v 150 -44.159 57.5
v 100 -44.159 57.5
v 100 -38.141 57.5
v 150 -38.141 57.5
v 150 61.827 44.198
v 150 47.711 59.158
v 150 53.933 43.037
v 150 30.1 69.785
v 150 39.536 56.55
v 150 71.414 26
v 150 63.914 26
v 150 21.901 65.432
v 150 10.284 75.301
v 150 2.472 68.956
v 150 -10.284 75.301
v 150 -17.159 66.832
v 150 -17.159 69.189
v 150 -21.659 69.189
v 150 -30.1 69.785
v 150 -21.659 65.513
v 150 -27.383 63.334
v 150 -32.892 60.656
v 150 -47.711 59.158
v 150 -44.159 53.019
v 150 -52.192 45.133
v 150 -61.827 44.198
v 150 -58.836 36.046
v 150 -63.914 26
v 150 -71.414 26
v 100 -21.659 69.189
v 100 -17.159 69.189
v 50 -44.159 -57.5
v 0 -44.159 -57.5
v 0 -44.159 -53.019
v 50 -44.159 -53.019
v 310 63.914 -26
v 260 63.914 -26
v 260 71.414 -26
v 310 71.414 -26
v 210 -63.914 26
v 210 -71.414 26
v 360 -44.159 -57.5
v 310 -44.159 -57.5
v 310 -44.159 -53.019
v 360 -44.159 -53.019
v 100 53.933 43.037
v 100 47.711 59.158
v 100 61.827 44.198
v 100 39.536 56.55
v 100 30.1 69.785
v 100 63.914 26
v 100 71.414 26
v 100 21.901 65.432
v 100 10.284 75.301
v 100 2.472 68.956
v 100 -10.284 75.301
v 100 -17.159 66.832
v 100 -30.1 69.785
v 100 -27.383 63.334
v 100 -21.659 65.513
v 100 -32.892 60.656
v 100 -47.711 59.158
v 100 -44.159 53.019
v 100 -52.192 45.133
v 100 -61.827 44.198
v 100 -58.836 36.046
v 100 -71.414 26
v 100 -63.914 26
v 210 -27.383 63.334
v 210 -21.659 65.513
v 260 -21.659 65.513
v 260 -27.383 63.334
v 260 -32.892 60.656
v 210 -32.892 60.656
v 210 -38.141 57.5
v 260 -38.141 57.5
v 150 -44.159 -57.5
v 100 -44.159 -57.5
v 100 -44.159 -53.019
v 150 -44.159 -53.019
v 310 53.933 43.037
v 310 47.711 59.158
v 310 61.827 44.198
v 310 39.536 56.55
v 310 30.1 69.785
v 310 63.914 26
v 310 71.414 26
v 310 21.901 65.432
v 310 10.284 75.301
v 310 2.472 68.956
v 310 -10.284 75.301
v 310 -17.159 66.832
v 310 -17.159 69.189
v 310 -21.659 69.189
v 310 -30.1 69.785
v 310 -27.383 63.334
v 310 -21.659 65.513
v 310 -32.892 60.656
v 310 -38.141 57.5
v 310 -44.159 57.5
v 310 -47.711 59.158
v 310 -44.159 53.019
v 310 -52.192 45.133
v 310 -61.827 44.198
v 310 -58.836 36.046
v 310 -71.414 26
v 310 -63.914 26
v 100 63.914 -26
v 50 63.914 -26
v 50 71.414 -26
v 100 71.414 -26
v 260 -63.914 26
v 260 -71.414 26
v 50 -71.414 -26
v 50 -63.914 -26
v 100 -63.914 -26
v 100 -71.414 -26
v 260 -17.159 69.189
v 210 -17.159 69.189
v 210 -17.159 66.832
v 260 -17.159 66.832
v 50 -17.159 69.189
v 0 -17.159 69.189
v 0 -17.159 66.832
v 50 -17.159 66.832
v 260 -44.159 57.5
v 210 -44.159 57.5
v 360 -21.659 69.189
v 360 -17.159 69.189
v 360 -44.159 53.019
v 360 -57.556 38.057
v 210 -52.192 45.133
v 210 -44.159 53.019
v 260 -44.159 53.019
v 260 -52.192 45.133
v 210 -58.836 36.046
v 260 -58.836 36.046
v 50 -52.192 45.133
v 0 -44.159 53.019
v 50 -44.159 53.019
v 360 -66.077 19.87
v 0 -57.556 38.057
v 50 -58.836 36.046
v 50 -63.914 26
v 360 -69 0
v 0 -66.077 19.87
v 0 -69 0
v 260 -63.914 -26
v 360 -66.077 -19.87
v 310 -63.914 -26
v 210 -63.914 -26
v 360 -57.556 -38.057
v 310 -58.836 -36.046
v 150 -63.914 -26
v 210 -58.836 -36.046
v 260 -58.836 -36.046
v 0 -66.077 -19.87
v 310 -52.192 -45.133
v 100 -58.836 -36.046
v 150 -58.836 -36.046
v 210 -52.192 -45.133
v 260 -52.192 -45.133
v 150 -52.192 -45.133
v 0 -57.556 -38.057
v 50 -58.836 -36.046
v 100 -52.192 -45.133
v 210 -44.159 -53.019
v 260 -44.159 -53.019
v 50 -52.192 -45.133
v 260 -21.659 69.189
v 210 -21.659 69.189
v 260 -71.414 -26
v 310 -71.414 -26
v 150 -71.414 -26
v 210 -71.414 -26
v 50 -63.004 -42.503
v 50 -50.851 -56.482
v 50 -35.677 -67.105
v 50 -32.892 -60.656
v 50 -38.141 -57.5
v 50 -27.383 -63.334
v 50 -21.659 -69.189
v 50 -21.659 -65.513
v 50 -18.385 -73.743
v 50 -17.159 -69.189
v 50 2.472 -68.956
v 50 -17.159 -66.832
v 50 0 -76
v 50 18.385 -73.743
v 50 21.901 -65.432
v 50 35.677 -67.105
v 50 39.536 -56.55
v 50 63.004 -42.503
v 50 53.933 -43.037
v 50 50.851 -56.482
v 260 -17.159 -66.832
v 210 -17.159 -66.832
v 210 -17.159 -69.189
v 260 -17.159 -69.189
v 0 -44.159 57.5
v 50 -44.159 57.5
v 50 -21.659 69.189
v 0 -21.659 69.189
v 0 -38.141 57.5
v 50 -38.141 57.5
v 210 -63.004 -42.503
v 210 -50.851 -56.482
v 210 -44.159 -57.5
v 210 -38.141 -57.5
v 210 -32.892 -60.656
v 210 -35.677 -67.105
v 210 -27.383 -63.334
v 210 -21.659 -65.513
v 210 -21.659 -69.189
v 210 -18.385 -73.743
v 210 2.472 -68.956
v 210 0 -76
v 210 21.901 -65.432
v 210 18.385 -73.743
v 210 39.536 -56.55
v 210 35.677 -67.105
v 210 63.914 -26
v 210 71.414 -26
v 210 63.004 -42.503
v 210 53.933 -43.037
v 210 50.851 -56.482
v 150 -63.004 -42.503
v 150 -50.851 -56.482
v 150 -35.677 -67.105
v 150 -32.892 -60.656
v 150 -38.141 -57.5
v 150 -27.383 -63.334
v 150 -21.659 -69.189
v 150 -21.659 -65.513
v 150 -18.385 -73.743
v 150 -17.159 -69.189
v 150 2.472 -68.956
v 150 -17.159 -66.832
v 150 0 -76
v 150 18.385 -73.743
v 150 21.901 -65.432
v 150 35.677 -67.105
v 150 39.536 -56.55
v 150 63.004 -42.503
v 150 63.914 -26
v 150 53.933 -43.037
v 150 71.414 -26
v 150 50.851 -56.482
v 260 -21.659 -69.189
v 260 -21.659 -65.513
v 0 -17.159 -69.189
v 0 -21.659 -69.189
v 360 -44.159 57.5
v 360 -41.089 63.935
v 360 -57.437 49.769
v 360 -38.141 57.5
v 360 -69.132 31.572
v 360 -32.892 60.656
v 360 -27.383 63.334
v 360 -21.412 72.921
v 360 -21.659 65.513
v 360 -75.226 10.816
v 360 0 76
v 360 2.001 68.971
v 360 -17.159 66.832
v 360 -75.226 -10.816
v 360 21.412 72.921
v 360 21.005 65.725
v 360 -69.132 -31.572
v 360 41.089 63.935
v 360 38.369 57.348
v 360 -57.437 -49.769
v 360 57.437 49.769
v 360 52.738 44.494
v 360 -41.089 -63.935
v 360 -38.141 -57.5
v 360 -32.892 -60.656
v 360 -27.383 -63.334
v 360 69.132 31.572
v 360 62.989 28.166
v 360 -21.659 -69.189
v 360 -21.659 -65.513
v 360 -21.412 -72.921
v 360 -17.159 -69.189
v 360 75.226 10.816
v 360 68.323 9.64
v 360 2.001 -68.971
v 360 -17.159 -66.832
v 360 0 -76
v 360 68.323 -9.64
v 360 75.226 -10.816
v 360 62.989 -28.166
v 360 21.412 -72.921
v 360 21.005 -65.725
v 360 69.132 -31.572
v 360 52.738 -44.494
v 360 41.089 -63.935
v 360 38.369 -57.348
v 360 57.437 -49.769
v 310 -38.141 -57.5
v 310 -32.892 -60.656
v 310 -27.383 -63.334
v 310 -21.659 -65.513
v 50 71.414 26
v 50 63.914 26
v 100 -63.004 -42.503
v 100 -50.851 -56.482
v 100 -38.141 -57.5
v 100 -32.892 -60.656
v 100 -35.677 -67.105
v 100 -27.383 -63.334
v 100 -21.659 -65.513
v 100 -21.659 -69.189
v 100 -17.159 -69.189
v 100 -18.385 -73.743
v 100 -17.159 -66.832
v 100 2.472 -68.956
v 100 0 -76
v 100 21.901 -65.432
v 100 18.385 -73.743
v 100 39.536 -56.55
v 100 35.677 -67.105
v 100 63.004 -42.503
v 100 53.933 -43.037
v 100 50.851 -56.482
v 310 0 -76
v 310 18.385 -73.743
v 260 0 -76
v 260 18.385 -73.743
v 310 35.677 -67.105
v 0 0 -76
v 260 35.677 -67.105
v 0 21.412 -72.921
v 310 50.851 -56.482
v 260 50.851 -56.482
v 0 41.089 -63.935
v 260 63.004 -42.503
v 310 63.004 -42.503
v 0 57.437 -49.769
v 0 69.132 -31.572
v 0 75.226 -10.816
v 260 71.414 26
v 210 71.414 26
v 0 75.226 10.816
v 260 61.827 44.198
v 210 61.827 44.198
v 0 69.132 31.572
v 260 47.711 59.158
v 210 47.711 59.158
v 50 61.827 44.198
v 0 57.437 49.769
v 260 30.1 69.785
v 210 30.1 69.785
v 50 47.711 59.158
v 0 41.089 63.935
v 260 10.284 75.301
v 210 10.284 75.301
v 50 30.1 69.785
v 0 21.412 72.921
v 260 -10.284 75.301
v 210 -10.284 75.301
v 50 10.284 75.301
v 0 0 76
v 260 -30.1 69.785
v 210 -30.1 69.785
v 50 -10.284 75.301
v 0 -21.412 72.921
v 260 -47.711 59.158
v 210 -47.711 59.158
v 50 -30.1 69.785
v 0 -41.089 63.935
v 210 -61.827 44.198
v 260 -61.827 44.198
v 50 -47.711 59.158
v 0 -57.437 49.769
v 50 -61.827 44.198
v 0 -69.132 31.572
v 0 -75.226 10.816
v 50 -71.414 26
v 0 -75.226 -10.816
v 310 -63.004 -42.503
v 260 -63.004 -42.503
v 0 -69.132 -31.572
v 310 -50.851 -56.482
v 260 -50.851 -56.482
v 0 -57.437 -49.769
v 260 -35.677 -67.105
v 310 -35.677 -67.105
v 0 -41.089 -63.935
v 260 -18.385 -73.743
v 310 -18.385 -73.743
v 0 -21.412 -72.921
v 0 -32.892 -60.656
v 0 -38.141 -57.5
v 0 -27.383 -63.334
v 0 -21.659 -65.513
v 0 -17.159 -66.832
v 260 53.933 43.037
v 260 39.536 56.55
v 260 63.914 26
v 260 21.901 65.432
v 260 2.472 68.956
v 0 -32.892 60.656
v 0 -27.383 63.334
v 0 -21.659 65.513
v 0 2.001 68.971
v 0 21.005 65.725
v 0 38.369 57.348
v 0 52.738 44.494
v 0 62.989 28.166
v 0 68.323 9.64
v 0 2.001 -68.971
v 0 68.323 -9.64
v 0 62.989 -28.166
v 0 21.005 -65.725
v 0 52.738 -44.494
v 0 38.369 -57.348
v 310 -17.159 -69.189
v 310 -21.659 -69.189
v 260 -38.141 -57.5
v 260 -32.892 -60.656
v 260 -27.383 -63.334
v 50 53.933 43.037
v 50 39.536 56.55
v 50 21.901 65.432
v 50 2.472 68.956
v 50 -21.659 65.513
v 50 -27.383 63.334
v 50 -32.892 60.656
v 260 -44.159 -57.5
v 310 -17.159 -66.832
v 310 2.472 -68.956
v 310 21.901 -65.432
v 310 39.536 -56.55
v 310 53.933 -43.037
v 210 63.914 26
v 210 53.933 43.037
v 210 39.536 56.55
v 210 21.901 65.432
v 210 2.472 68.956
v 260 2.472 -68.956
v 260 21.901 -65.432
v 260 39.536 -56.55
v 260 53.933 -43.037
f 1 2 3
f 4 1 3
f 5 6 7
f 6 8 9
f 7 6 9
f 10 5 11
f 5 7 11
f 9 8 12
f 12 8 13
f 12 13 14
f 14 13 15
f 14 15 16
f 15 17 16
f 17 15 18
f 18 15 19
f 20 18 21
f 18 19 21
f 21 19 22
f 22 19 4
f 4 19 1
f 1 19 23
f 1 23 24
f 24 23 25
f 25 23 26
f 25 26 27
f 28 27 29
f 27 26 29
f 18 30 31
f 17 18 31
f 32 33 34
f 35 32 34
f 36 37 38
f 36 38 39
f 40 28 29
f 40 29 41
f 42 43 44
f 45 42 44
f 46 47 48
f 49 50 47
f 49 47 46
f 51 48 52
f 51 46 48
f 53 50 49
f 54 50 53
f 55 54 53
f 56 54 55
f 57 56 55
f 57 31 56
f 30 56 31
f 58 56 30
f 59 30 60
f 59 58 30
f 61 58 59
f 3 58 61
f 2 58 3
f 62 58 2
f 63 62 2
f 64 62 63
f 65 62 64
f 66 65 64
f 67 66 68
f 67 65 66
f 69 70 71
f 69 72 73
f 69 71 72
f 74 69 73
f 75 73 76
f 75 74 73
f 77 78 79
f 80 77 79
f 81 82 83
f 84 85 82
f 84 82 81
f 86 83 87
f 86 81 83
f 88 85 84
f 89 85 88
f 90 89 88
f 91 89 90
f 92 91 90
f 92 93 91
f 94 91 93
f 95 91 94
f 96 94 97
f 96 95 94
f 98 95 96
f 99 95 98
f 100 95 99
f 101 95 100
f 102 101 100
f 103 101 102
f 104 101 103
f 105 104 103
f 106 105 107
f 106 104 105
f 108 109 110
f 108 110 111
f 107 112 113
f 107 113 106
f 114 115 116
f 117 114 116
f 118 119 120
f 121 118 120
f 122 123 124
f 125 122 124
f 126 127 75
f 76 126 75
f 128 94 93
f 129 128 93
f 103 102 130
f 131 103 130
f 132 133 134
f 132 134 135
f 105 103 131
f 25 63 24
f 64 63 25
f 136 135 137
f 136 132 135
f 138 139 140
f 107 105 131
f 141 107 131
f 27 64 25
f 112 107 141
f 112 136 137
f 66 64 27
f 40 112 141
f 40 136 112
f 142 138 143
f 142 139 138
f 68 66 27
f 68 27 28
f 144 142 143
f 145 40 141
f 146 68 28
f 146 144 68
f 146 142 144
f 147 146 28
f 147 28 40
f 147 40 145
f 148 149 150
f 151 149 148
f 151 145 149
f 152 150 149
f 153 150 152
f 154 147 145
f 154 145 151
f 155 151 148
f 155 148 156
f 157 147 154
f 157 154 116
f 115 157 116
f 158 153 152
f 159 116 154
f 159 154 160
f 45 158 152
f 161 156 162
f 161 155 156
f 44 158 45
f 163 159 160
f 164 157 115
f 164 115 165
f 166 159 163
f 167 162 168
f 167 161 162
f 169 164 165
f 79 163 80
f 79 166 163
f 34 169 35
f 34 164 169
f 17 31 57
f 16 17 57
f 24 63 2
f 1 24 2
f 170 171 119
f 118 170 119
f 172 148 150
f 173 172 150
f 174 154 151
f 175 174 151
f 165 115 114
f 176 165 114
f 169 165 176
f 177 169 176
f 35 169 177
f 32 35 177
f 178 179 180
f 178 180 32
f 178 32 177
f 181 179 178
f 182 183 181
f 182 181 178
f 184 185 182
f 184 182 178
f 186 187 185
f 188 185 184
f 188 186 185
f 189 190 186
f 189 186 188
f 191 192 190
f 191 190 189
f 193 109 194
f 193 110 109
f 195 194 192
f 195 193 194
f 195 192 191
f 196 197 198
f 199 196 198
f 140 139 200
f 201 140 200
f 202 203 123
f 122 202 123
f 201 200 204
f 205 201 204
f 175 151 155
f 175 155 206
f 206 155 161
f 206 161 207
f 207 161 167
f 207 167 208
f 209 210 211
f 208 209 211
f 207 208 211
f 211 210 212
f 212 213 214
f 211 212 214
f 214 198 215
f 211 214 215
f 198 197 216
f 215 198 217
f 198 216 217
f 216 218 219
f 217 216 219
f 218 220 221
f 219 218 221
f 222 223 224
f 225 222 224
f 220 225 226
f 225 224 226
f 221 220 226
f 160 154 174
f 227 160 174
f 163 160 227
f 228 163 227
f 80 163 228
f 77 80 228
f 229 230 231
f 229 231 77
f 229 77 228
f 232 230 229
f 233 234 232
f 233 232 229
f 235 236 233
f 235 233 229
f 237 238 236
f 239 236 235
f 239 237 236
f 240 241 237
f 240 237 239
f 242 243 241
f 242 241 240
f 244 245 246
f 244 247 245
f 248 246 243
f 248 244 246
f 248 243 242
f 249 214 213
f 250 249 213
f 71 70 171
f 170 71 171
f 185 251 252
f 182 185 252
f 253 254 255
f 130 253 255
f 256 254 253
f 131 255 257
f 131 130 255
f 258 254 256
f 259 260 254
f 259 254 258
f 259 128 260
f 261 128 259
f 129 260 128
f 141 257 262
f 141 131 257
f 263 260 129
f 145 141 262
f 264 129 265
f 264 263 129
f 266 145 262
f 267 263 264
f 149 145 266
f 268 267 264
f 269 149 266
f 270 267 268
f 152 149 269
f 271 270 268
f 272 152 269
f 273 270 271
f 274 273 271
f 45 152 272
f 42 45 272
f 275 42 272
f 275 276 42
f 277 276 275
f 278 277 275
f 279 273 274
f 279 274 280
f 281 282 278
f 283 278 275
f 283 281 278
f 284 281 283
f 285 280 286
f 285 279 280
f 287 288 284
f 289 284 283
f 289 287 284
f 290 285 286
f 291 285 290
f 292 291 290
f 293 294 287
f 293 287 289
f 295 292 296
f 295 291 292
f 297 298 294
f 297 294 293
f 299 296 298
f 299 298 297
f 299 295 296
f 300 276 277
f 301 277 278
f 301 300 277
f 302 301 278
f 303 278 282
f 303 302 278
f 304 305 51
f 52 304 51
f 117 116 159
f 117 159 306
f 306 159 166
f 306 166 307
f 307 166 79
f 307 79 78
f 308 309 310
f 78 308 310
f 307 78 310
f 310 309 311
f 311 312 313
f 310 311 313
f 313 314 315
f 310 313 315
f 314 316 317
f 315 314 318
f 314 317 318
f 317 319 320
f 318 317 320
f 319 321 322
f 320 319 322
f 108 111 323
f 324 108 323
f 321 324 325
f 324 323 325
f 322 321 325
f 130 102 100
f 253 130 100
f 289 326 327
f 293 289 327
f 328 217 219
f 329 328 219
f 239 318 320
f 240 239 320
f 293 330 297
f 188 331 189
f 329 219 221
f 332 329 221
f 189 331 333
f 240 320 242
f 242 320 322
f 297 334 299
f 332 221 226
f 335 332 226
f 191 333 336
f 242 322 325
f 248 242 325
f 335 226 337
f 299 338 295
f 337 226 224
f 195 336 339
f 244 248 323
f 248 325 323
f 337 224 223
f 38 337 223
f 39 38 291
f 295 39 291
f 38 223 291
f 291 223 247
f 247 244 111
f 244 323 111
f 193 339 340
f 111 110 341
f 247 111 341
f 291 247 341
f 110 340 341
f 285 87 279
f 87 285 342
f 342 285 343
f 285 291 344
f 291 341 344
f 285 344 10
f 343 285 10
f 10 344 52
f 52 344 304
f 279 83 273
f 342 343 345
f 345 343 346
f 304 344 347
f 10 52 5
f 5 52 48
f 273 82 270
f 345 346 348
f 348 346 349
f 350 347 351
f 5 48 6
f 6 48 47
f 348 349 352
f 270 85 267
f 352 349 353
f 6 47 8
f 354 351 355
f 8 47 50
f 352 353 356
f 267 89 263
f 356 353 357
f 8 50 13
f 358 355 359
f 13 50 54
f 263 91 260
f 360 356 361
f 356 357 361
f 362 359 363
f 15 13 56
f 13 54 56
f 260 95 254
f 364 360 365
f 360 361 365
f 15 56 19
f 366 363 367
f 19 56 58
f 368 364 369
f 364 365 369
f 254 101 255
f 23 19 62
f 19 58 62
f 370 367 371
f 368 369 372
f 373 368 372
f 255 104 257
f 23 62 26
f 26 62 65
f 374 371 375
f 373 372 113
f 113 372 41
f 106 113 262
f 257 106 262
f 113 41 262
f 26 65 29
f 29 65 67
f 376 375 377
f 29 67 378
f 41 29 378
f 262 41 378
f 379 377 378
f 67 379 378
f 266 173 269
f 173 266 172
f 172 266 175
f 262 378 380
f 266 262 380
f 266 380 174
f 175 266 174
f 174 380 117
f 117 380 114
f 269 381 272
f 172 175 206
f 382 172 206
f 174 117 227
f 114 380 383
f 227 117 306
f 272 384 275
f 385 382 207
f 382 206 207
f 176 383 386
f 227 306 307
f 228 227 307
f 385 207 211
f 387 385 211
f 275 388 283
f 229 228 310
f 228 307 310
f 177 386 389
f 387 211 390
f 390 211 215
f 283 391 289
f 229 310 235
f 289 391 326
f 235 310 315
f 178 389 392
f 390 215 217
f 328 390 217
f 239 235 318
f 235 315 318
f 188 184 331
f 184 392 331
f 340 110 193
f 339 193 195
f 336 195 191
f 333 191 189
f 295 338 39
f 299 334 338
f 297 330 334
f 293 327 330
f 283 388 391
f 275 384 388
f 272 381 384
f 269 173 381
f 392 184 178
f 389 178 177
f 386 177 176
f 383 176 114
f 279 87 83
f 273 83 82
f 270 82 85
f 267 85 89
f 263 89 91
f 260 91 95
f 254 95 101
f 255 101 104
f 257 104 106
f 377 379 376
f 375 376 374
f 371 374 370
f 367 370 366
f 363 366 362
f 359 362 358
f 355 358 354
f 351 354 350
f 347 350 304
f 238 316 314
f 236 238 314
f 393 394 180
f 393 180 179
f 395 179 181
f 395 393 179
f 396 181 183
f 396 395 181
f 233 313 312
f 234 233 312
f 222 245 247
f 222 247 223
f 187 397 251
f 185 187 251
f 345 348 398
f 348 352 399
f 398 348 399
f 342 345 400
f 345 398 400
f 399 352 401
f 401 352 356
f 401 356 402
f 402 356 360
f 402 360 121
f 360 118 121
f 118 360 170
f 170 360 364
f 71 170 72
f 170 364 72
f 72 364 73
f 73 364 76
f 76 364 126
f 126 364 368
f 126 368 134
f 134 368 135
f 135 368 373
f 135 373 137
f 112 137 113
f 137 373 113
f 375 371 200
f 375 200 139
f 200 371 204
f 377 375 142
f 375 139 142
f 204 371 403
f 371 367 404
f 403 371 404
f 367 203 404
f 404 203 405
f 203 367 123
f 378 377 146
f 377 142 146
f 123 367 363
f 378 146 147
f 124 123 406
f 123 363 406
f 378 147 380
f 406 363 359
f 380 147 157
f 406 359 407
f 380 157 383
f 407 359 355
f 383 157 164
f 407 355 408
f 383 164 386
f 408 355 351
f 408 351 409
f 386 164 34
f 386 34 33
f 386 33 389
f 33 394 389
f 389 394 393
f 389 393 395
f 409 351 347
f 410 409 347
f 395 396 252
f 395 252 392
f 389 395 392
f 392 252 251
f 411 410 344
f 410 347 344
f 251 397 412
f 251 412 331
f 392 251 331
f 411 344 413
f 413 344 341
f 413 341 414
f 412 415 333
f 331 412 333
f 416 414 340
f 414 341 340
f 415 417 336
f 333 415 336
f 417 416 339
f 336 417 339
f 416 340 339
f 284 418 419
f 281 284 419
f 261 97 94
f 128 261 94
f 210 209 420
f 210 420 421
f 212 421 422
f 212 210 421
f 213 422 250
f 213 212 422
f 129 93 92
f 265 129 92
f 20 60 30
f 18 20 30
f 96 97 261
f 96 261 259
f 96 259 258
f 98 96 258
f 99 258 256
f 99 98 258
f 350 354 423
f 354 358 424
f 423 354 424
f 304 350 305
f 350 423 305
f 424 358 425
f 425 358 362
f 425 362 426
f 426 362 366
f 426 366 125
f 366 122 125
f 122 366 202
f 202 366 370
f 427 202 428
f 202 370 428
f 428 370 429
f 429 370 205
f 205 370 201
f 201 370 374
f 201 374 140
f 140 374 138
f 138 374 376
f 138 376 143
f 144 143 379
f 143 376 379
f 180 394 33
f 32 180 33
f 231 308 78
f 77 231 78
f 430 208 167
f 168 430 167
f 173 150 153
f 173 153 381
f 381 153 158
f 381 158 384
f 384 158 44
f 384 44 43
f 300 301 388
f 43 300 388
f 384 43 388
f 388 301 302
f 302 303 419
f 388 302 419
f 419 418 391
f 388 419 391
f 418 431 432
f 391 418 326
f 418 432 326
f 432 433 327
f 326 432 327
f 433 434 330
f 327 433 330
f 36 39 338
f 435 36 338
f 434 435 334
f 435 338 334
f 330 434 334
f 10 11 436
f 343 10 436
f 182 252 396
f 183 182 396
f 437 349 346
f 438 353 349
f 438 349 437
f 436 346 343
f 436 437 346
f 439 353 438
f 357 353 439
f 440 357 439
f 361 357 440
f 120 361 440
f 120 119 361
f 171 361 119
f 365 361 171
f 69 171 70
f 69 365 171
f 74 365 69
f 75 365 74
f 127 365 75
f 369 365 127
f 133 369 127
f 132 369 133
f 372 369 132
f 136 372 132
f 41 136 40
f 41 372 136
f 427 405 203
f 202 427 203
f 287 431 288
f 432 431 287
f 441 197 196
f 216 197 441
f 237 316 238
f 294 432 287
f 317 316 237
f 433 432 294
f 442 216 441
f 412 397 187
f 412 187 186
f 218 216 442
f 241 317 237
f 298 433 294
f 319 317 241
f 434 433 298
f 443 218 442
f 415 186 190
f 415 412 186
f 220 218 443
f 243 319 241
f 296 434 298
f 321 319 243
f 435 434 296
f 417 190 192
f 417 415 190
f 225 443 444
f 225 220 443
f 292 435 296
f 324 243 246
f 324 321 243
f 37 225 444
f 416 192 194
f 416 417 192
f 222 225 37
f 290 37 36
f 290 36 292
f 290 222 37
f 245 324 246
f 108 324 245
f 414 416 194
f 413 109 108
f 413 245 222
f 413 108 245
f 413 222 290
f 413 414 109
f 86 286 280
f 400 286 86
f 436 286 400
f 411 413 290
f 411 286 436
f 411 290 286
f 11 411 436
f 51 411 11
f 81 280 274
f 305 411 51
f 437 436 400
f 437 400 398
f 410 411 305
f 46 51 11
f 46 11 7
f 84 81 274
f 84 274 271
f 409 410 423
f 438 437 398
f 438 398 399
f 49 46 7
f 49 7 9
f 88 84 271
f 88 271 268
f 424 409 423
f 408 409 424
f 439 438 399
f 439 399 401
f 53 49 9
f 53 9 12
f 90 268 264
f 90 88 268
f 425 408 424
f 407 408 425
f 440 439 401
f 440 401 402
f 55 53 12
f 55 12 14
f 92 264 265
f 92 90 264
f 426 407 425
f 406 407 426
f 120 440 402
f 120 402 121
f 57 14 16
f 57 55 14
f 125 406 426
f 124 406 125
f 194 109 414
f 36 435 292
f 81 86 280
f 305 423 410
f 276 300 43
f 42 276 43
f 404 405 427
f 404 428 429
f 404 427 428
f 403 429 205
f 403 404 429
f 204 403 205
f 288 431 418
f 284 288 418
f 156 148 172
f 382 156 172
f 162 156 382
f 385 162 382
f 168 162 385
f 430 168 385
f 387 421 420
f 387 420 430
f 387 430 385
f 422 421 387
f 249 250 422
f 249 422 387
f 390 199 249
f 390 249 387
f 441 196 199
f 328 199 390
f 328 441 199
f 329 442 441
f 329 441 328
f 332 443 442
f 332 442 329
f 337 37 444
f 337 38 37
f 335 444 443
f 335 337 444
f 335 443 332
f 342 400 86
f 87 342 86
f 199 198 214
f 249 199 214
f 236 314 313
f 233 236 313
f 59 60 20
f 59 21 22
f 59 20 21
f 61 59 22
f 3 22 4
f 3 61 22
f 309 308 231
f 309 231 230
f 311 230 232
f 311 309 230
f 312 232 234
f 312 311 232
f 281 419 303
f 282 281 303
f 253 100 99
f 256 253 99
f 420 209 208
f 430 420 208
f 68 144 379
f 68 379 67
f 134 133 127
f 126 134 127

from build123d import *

# Parameters (mm, degrees)
SKETCH1_R               = 76
SKETCH1_R_2             = 69
BOSS_EXTRUDE3_DEPTH     = 360
SKETCH2_W               = 50
SKETCH2_H               = 50
SKETCH2_W_2             = 60
CUT_EXTRUDE1_DEPTH      = 125
CUT_EXTRUDE1_DEPTH_BACK = 135
SKETCH3_W               = 60
SKETCH3_H               = 50
SKETCH3_W_2             = 50
CUT_EXTRUDE3_DEPTH      = 196
CUT_EXTRUDE3_DEPTH_BACK = 244
CUT_EXTRUDE4_DEPTH      = 404


with BuildPart() as part:
    # Sketch1 → Boss-Extrude3 (new body)
    with BuildSketch(Plane(origin=(0, 0, 0), x_dir=(0, 0, -1), z_dir=(1, 0, 0))):
        Circle(SKETCH1_R)
        Circle(SKETCH1_R_2, mode=Mode.SUBTRACT)
    extrude(amount=BOSS_EXTRUDE3_DEPTH)

    # Sketch2 → Cut-Extrude1 (cut, two sides)
    with BuildSketch(Plane(origin=(0, 0, 0), x_dir=(1, 0, 0), z_dir=(0, 1, 0))) as cut_extrude1_sk:
        with Locations((75, 51)):
            Rectangle(SKETCH2_W, SKETCH2_H)
        with Locations((285, 51)):
            Rectangle(SKETCH2_W, SKETCH2_H)
        with Locations((180, 51)):
            Rectangle(SKETCH2_W_2, SKETCH2_H)
    extrude(amount=CUT_EXTRUDE1_DEPTH, mode=Mode.SUBTRACT)
    extrude(cut_extrude1_sk.sketch, amount=-CUT_EXTRUDE1_DEPTH_BACK, mode=Mode.SUBTRACT)

    # Sketch3 → Cut-Extrude3 (cut, two sides)
    with BuildSketch(Plane(origin=(0, 0, 0), x_dir=(1, 0, 0), z_dir=(0, 1, 0))) as cut_extrude3_sk:
        with Locations((180, -51)):
            Rectangle(SKETCH3_W, SKETCH3_H)
        with Locations((75, -51)):
            Rectangle(SKETCH3_W_2, SKETCH3_H)
        with Locations((285, -51)):
            Rectangle(SKETCH3_W_2, SKETCH3_H)
    extrude(amount=CUT_EXTRUDE3_DEPTH, mode=Mode.SUBTRACT)
    extrude(cut_extrude3_sk.sketch, amount=-CUT_EXTRUDE3_DEPTH_BACK, mode=Mode.SUBTRACT)

    # Sketch4 → Cut-Extrude4 (cut)
    with BuildSketch(Plane.ZY):
        with BuildLine():
            Line((-69.189205769, -21.658804332), (-65.512565168, -21.658804332))
            ThreePointArc((-65.512565168, -21.658804332), (-66.210745314, -19.420020724), (-66.832442974, -17.158804332))
            Line((-66.832442974, -17.158804332), (-69.189205769, -17.158804332))
            Line((-69.189205769, -17.158804332), (-69.189205769, -21.658804332))
        make_face()
        with BuildLine():
            Line((-57.5, -38.141185089), (-57.5, -44.158804332))
            Line((-57.5, -44.158804332), (-53.018864567, -44.158804332))
            ThreePointArc((-53.018864567, -44.158804332), (-55.341284695, -41.210947676), (-57.5, -38.141185089))
        make_face()
        with BuildLine():
            ThreePointArc((57.5, -38.141185089), (55.341284695, -41.210947676), (53.018864567, -44.158804332))
            Line((53.018864567, -44.158804332), (57.5, -44.158804332))
            Line((57.5, -44.158804332), (57.5, -38.141185089))
        make_face()
        with BuildLine():
            ThreePointArc((66.832442974, -17.158804332), (66.210745314, -19.420020724), (65.512565168, -21.658804332))
            Line((65.512565168, -21.658804332), (69.189205769, -21.658804332))
            Line((69.189205769, -21.658804332), (69.189205769, -17.158804332))
            Line((69.189205769, -17.158804332), (66.832442974, -17.158804332))
        make_face()
    extrude(amount=-CUT_EXTRUDE4_DEPTH, mode=Mode.SUBTRACT)


solid = part.part
